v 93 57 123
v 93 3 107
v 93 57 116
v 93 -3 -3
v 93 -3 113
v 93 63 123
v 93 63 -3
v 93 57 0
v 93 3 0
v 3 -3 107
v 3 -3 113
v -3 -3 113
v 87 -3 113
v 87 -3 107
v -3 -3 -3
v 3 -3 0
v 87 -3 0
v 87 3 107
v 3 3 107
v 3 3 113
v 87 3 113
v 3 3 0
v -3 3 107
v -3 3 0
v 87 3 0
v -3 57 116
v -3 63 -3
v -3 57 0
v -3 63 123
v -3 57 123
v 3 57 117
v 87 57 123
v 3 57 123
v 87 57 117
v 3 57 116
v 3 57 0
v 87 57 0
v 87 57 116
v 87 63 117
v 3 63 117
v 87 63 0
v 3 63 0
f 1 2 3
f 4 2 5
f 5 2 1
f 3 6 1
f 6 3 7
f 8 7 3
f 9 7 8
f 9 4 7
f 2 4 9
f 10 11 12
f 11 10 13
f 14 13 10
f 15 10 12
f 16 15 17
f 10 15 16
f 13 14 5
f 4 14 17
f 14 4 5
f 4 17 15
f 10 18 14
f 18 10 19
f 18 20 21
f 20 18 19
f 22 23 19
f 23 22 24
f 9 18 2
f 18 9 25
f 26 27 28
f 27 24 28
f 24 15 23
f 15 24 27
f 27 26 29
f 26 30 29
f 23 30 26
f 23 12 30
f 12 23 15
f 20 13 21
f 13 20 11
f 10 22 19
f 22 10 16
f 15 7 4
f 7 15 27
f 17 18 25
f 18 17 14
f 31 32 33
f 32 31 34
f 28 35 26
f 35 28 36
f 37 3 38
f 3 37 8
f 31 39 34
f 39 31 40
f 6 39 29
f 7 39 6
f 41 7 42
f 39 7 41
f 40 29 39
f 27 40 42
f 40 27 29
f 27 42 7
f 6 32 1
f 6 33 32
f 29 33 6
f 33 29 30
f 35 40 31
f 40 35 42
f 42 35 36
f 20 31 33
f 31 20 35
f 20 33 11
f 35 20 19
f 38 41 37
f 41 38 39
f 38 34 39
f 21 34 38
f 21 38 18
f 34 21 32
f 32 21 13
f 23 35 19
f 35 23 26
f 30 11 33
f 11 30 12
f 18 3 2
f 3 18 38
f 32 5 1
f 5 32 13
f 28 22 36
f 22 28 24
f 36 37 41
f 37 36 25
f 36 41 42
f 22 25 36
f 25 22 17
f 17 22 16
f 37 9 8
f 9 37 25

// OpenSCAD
// ── Slanted Box Frame + Bottom Plate ─────────────────────────────────
// y=0: 手前（開口側） / y=depth: 背面。上面は前→奥で斜め。
width        = 90;
depth        = 60;
height_front = 110;
height_back  = 120;

rod          = 6;    // 角棒の太さ（正方断面）
plate_thick  = 3;    // 下面プレートの厚み
plate_inside = true; // true: 枠の内側に収める / false: 外形にぴったり

// 2点 p1, p2 をつなぐ角棒（回転なし：小キューブの hull）
module rod_between(p1, p2){
  hull(){
    translate(p1) cube([rod, rod, rod], center=true);
    translate(p2) cube([rod, rod, rod], center=true);
  }
}

// ── コーナー座標 ────────────────────────────────────────────────
FLB = [0,     0,     0];
FRB = [width, 0,     0];
FLT = [0,     0,     height_front];
FRT = [width, 0,     height_front];

BLB = [0,     depth, 0];
BRB = [width, depth, 0];
BLT = [0,     depth, height_back];
BRT = [width, depth, height_back];

// ── フレーム本体（底の四辺は作らず → 下は板にする） ────────────────
module slanted_frame_without_bottom_edges(){
  // 前面（開口側）枠（上・左右）
  rod_between(FLT, FRT);
  rod_between(FLB, FLT);
  rod_between(FRB, FRT);

  // 背面枠（上・左右）
  rod_between(BLT, BRT);
  rod_between(BLB, BLT);
  rod_between(BRB, BRT);

  // 前後連結（上2本は斜め）
  rod_between(FLT, BLT);
  rod_between(FRT, BRT);
}

// ── 下面プレート ────────────────────────────────────────────────
module bottom_plate(){
  if (plate_inside){
    // 枠の内側に収める（左右/前後とも棒の半分だけ内側にオフセット）
    translate([0-rod/2, 0-rod/2, -rod/2])
      cube([width+rod, depth+rod, plate_thick], center=false);
  } else {
    // 外形ぴったり（X:0..width, Y:0..depth）
    cube([width, depth, plate_thick], center=false);
  }
}

// ── 組み立て ────────────────────────────────────────────────────
slanted_frame_without_bottom_edges();
bottom_plate();
